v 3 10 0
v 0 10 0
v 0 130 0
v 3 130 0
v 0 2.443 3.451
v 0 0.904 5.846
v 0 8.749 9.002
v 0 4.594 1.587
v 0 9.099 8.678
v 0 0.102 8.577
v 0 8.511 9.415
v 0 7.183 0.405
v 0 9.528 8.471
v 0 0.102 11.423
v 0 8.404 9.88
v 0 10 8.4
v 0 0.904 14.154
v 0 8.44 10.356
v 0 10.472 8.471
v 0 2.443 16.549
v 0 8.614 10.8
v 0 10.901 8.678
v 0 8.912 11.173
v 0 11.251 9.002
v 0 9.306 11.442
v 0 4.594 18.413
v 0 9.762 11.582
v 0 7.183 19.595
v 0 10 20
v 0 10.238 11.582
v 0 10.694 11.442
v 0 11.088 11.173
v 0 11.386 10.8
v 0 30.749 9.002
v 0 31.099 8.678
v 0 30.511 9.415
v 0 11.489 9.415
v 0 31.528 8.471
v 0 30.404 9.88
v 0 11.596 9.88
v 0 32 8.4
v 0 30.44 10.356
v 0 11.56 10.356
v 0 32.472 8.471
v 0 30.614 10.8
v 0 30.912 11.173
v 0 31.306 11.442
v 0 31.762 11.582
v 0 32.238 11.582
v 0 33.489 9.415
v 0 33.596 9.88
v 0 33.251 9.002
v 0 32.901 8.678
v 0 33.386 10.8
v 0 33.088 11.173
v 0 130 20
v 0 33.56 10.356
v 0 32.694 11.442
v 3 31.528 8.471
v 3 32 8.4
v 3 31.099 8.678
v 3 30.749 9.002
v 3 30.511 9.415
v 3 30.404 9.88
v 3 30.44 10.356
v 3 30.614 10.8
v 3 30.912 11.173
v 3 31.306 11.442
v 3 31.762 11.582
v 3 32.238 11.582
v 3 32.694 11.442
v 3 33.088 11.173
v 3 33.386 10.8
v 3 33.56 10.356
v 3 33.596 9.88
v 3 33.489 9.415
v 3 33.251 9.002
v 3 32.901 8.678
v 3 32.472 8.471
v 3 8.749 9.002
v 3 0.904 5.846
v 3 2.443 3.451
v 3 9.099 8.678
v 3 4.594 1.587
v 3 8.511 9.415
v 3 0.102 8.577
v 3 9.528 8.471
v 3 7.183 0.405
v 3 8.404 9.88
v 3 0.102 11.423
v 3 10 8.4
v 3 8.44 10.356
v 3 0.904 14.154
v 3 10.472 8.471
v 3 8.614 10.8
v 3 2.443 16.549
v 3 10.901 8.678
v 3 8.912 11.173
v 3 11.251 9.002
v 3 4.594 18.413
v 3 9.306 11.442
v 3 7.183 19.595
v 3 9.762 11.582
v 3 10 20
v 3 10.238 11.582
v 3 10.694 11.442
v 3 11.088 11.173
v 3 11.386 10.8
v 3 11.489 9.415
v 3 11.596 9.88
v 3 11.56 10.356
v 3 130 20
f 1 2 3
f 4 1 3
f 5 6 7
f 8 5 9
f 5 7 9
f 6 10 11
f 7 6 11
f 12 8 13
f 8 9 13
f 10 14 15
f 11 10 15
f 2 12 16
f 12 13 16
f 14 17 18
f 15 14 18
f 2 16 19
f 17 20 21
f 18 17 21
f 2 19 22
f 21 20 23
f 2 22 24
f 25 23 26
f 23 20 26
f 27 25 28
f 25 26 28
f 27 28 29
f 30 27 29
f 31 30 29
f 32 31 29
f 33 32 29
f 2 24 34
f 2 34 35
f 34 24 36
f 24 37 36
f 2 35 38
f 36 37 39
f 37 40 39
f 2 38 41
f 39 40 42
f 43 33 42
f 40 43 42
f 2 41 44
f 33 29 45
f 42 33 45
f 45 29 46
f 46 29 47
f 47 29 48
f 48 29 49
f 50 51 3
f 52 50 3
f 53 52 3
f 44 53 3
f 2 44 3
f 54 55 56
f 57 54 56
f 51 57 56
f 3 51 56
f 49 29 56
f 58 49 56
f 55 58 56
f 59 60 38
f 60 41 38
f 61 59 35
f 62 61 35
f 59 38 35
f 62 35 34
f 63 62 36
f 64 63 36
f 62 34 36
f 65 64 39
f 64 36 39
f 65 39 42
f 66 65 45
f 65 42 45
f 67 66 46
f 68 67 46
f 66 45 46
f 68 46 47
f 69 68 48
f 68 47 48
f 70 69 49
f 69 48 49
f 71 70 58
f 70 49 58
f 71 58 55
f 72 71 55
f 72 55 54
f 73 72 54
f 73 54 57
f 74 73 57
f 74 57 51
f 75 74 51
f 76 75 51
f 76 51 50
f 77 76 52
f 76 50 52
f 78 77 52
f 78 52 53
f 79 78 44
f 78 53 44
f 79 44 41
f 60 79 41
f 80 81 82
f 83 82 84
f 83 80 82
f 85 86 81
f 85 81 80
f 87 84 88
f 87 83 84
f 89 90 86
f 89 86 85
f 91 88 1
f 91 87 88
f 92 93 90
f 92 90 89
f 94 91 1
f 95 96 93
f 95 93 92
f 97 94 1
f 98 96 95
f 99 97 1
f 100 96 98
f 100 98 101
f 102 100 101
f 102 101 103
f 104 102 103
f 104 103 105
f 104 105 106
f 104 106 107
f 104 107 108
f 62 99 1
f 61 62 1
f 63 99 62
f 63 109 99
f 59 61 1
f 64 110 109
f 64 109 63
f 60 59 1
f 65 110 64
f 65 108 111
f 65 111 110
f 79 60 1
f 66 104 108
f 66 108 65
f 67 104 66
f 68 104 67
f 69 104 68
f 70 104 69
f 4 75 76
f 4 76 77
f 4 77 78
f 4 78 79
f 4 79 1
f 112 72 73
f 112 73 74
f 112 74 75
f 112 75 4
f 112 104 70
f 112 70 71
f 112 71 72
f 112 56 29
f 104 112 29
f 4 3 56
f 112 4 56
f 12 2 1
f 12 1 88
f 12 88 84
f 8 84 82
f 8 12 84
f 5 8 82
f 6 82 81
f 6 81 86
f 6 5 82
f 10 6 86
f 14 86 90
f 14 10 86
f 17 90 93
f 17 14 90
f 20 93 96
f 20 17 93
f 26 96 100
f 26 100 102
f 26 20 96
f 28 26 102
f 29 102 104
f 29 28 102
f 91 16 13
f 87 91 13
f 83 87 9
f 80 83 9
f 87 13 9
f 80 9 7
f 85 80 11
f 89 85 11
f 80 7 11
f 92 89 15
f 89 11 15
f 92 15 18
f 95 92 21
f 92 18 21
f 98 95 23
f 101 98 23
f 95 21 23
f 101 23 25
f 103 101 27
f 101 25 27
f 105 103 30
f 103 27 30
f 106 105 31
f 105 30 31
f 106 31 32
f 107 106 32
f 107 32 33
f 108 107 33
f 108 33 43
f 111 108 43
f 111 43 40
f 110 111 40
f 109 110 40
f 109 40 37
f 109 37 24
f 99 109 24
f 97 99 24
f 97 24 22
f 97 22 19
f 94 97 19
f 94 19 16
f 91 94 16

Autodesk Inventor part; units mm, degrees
ref_plane "YZ Plane" through (0, 0, 0) normal (1, 0, 0) x (0, 1, 0)
ref_plane "XZ Plane" through (0, 0, 0) normal (0, 1, 0) x (-1, 0, 0)
ref_plane "XY Plane" through (0, 0, 0) normal (0, 0, 1) x (1, 0, 0)
sketch "Szkic1" plane through (0, 0, 0) normal (1, 0, 0) x (0, 1, 0)
  line L0 (10, 0) -> (130, 0)
  line L1 (130, 0) -> (130, 20)
  line L2 (130, 20) -> (10, 20)
  line L3 (0, 10) -> (0, 10)
  arc A0 (0, 10) -> (10, 0) centre (10, 10) ccw
  arc A1 (10, 20) -> (0, 10) centre (10, 10) ccw
  circle A2 centre (32, 10) radius 1.6
  point P0 (0, 0)
  point P1 (0, 20)
  dimension "d0" = 20
  dimension "d2" = 10
  dimension "d12" = 120
  dimension "d13" = 32
  dimension "d14" = 3.2
extrude "Wyciągnięcie proste1" add sketch "Szkic1" along normal blind 3 contours A0 A1 L2 L1 L0 | A2
sketch "Szkic2" plane through (3, 0, 0) normal (1, 0, 0) x (0, 0, -1)
  arc A0 (-20, 10) -> (0, 10) centre (-10, 10) ccw projected
  point P0 (0, 0)
hole "Otwór1" at (3, 10, 10) direction (-1, 0, 0) diameter 3.2 end through all
sketch "Szkic3" plane through (3, 0, 0) normal (1, 0, 0) x (0, 0, -1)
  point P0 (0, 0)
  point P1 (-10, 32)
  dimension "d15" = 32
hole "Otwór2" at (3, 32, 10) direction (-1, 0, 0) diameter 3.2 end through all
properties material "Drewno (wiśnia)"
